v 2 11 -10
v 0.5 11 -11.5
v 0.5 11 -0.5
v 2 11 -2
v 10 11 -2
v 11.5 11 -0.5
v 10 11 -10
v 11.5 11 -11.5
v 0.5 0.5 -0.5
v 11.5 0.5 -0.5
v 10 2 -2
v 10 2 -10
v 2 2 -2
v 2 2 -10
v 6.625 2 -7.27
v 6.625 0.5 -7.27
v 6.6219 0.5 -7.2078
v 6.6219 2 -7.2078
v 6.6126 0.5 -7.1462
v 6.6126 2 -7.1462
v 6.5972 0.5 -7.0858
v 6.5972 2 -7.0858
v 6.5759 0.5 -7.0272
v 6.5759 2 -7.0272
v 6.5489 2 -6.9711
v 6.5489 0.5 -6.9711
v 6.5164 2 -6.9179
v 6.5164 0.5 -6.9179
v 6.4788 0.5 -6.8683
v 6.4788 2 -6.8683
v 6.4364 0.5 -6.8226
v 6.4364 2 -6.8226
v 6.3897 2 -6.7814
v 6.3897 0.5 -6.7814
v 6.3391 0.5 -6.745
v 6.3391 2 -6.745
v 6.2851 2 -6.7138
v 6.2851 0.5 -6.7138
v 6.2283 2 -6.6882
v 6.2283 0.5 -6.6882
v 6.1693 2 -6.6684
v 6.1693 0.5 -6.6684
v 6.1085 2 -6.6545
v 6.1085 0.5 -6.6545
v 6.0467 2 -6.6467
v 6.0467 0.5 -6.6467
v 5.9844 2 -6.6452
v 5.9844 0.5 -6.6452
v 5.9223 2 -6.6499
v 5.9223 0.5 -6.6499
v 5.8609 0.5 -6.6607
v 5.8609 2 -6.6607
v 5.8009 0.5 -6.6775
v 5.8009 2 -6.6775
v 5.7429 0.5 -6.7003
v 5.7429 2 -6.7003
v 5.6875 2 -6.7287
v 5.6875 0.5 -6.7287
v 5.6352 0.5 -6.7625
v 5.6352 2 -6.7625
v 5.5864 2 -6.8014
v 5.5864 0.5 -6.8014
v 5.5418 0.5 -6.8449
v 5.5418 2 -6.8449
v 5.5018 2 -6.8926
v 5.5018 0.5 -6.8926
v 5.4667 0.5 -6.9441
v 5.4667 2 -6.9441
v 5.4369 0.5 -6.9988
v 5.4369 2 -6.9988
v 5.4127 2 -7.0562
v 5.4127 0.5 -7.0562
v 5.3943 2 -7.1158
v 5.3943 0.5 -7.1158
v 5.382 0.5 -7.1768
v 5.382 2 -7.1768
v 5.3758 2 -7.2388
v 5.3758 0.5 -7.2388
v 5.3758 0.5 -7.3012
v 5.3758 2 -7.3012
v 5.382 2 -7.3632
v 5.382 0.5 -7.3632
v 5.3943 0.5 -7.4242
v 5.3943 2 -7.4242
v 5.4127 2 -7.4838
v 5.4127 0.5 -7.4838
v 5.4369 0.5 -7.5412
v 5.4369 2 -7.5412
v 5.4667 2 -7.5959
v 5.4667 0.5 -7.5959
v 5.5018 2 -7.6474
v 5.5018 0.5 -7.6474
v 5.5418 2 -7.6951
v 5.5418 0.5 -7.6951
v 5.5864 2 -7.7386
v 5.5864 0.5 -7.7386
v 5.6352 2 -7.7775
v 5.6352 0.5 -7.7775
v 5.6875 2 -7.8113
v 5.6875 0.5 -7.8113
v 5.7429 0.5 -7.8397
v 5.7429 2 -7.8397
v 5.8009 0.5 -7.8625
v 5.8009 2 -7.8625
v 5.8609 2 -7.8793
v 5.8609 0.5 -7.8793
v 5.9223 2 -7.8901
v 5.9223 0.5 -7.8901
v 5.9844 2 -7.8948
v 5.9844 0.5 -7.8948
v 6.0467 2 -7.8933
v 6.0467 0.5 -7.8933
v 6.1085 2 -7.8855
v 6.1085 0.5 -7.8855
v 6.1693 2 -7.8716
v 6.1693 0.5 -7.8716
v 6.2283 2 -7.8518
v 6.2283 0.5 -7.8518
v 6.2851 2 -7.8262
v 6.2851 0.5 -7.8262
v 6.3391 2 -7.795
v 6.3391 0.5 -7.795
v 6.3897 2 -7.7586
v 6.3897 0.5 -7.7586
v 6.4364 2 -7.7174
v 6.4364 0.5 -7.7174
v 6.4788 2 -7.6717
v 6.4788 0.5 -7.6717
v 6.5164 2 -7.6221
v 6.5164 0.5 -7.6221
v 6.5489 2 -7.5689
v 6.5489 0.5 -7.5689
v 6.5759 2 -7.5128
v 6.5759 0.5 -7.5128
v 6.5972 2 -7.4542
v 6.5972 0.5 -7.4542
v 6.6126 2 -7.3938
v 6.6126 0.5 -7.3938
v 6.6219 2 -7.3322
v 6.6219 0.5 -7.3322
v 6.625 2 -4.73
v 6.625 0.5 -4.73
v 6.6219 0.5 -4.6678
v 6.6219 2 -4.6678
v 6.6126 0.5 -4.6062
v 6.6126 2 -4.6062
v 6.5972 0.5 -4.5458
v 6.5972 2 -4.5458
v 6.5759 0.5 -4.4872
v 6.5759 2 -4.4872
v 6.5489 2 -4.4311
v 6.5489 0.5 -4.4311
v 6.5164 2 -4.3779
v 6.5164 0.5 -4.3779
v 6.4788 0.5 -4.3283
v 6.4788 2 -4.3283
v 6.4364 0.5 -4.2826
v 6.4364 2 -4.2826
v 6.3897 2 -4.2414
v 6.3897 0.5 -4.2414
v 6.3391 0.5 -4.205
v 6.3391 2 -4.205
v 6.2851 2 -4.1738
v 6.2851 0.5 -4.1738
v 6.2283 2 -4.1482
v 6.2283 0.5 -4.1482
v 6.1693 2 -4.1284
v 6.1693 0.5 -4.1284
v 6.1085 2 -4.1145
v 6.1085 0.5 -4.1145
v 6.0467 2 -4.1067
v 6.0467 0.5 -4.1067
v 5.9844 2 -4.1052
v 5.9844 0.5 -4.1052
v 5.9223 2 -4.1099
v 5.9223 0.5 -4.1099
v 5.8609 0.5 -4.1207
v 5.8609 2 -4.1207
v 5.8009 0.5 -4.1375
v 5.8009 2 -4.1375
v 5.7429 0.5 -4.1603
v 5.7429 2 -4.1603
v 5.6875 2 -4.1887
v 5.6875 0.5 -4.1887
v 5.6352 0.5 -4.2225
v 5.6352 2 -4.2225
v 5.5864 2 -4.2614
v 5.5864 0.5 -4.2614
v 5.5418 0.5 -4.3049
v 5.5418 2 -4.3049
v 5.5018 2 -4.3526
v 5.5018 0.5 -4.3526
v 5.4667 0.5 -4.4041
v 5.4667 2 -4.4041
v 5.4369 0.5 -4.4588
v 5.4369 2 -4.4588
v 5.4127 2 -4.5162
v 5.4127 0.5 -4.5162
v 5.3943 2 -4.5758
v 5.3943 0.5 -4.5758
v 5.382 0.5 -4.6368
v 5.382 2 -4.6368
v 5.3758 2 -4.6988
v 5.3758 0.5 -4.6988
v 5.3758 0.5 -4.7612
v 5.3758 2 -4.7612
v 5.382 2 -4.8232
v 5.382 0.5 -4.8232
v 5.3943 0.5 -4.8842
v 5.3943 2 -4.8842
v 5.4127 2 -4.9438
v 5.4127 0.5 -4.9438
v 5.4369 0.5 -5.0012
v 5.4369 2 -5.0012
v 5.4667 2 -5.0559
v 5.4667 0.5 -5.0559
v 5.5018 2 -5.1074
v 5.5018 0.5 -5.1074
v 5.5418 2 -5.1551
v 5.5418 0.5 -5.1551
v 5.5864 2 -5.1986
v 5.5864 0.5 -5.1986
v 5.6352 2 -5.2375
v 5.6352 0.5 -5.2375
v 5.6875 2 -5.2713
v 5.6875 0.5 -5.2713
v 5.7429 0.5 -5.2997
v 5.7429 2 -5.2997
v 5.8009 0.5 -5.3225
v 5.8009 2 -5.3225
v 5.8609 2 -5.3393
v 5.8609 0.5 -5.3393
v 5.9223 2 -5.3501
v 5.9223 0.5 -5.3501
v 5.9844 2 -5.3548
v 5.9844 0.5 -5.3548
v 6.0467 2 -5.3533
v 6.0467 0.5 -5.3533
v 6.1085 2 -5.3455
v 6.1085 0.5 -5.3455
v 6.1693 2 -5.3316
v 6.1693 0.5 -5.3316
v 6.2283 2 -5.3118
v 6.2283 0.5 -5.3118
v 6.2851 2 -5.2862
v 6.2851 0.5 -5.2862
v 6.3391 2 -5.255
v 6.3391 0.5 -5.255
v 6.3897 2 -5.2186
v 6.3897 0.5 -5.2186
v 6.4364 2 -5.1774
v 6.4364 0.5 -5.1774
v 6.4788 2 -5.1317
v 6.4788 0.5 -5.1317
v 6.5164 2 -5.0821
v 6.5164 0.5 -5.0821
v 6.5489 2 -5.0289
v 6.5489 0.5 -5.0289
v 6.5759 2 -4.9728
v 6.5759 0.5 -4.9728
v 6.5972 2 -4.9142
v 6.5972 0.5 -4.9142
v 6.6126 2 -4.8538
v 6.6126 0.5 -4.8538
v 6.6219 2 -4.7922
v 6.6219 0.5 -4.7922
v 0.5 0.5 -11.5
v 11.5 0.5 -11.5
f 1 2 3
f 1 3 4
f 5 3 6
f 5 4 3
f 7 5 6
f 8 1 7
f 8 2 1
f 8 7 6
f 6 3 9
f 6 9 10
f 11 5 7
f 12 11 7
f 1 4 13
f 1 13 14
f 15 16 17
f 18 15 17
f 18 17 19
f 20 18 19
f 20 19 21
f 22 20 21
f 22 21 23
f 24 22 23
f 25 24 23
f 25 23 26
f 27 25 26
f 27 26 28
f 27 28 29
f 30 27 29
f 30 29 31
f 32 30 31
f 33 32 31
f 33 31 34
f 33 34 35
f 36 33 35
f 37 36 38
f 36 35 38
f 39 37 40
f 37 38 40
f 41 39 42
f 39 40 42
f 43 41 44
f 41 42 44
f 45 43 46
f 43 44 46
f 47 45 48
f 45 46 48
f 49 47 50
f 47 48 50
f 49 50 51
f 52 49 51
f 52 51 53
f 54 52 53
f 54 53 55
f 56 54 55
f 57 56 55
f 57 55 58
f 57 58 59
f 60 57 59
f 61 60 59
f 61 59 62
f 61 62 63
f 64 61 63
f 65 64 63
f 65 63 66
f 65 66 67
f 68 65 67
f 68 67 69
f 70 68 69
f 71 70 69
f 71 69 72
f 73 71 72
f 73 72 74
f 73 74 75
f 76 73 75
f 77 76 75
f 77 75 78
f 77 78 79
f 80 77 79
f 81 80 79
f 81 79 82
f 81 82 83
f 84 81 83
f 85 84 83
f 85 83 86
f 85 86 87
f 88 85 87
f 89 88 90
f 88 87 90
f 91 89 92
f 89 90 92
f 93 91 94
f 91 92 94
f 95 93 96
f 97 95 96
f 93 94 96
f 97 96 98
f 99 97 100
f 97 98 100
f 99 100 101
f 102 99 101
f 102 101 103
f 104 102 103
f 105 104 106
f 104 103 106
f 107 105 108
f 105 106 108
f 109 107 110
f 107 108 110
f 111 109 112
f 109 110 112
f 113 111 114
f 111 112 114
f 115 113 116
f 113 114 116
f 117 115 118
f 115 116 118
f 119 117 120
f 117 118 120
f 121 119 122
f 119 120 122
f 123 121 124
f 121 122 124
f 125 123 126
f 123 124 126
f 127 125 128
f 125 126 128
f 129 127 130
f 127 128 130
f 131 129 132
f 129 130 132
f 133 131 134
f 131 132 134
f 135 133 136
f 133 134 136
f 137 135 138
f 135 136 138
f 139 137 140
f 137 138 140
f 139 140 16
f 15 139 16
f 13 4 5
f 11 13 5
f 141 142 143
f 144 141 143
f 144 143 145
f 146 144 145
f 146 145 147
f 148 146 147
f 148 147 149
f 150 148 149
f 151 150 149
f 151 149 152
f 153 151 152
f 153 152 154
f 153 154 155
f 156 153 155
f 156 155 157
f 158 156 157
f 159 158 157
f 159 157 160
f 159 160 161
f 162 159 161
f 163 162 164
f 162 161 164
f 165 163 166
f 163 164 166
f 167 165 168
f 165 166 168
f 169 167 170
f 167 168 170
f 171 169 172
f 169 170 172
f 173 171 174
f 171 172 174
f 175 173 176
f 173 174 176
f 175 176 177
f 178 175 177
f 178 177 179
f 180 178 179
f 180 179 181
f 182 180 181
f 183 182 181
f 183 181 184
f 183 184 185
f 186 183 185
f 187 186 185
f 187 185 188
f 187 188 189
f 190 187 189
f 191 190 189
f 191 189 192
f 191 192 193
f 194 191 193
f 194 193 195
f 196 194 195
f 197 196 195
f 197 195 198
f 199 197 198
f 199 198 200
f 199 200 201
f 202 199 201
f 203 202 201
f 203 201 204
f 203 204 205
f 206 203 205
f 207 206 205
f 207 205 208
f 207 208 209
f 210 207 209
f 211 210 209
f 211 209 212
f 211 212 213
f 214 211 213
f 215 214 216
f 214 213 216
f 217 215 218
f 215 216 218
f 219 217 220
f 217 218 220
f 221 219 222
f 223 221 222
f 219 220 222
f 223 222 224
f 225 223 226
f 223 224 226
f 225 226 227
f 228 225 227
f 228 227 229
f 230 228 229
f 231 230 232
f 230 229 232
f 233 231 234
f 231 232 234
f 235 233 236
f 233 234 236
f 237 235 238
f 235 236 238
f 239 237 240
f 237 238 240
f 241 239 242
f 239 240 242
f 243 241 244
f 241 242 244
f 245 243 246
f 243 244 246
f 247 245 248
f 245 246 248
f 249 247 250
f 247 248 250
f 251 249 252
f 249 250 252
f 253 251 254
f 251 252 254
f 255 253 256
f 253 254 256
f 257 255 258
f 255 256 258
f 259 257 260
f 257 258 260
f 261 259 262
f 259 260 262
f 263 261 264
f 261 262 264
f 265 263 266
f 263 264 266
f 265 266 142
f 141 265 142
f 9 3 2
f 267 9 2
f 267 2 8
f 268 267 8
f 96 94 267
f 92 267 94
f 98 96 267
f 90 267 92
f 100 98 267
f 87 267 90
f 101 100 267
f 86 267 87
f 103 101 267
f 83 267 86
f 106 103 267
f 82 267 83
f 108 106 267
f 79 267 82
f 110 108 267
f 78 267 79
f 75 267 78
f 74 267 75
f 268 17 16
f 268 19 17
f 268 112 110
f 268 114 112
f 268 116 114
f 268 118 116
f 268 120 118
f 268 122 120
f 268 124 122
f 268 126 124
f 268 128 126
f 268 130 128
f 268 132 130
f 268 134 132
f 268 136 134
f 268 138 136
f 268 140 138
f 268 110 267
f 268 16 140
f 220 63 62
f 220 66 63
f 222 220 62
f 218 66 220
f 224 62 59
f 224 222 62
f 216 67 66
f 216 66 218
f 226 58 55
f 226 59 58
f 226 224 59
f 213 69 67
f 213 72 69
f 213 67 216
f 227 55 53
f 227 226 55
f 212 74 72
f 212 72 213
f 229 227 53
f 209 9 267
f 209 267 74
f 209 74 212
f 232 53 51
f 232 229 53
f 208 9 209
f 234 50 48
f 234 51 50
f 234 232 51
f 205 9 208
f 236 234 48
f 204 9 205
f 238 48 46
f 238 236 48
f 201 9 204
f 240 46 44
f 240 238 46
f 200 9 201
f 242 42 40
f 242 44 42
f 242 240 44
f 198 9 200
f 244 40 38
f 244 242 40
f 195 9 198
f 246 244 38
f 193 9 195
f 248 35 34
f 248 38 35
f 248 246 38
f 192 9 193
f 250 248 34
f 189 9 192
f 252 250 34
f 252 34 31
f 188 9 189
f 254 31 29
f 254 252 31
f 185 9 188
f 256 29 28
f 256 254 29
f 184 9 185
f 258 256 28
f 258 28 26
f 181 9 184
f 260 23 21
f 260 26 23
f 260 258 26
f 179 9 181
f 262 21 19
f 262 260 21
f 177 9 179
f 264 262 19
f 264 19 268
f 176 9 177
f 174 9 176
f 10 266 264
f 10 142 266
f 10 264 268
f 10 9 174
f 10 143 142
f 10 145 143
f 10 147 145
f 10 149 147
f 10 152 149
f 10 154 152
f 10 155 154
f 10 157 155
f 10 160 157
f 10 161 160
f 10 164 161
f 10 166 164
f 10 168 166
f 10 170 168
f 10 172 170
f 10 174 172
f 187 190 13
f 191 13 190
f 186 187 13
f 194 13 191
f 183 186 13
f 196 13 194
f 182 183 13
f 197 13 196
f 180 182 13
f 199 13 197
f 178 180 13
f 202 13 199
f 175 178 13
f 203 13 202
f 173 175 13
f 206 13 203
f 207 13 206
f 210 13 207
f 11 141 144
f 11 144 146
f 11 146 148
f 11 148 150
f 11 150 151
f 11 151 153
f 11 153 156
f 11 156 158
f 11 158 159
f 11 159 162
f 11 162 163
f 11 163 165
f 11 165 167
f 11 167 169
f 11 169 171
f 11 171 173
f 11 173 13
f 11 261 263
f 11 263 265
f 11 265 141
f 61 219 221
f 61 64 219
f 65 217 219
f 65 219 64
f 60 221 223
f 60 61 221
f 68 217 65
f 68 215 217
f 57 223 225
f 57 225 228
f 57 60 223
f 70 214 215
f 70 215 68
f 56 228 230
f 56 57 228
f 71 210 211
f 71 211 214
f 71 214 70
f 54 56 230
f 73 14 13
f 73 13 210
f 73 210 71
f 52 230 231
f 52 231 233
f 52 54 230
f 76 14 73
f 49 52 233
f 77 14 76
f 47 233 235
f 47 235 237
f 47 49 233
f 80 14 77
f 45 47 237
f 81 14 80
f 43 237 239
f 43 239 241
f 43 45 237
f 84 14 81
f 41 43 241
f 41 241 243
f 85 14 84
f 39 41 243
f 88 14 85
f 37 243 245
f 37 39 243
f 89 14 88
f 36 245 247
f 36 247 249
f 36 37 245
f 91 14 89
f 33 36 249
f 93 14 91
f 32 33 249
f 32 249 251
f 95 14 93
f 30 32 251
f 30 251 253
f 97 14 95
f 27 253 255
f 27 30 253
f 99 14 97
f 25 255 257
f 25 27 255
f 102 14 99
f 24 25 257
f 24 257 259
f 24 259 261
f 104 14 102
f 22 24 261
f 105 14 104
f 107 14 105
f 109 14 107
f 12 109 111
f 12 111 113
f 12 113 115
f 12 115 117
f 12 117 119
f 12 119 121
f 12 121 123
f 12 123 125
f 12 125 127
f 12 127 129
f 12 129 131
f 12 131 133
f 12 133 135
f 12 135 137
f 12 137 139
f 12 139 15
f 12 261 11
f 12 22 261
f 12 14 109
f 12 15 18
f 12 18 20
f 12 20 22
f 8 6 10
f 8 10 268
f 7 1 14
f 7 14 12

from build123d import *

# Parameters (mm, degrees)
SKETCH1_W           = 12
SKETCH1_H           = 12
BOSS_EXTRUDE1_DEPTH = 11
SHELL1_T            = -2
SKETCH3_R           = 0.625
CUT_EXTRUDE1_DEPTH  = 10
SKETCH4_W           = 12
SKETCH4_H           = 12
SKETCH4_W_2         = 11
SKETCH4_H_2         = 11
CUT_EXTRUDE2_DEPTH  = 12
SKETCH5_W           = 11
SKETCH5_H           = 11
CUT_EXTRUDE3_DEPTH  = 0.5


with BuildPart() as part:
    # Sketch1 → Boss-Extrude1 (new body)
    with BuildSketch(Plane(origin=(0, 0, 0), x_dir=(1, 0, 0), z_dir=(0, 1, 0))):
        with Locations((6, 6)):
            Rectangle(SKETCH1_W, SKETCH1_H)
    extrude(amount=BOSS_EXTRUDE1_DEPTH)

    # Shell1
    shell1_openings = [part.faces().sort_by_distance(p)[0] for p in [
        (6, 11, -6),
    ]]
    offset(amount=SHELL1_T, openings=shell1_openings, kind=Kind.INTERSECTION)

    # Sketch3 → Cut-Extrude1 (cut)
    with BuildSketch(Plane.XZ):
        with Locations((6, -4.73)):
            Circle(SKETCH3_R)
        with Locations((6, -7.27)):
            Circle(SKETCH3_R)
    extrude(amount=-CUT_EXTRUDE1_DEPTH, mode=Mode.SUBTRACT)

    # Sketch4 → Cut-Extrude2 (cut, through all)
    with BuildSketch(Plane(origin=(0, 11, 0), x_dir=(1, 0, 0), z_dir=(0, 1, 0))):
        with Locations((6, 6)):
            Rectangle(SKETCH4_W, SKETCH4_H)
        with Locations((6, 6)):
            Rectangle(SKETCH4_W_2, SKETCH4_H_2, mode=Mode.SUBTRACT)
    extrude(amount=-CUT_EXTRUDE2_DEPTH, mode=Mode.SUBTRACT)

    # Sketch5 → Cut-Extrude3 (cut)
    with BuildSketch(Plane.XZ):
        with Locations((6, -6)):
            Rectangle(SKETCH5_W, SKETCH5_H)
    extrude(amount=-CUT_EXTRUDE3_DEPTH, mode=Mode.SUBTRACT)


solid = part.part
